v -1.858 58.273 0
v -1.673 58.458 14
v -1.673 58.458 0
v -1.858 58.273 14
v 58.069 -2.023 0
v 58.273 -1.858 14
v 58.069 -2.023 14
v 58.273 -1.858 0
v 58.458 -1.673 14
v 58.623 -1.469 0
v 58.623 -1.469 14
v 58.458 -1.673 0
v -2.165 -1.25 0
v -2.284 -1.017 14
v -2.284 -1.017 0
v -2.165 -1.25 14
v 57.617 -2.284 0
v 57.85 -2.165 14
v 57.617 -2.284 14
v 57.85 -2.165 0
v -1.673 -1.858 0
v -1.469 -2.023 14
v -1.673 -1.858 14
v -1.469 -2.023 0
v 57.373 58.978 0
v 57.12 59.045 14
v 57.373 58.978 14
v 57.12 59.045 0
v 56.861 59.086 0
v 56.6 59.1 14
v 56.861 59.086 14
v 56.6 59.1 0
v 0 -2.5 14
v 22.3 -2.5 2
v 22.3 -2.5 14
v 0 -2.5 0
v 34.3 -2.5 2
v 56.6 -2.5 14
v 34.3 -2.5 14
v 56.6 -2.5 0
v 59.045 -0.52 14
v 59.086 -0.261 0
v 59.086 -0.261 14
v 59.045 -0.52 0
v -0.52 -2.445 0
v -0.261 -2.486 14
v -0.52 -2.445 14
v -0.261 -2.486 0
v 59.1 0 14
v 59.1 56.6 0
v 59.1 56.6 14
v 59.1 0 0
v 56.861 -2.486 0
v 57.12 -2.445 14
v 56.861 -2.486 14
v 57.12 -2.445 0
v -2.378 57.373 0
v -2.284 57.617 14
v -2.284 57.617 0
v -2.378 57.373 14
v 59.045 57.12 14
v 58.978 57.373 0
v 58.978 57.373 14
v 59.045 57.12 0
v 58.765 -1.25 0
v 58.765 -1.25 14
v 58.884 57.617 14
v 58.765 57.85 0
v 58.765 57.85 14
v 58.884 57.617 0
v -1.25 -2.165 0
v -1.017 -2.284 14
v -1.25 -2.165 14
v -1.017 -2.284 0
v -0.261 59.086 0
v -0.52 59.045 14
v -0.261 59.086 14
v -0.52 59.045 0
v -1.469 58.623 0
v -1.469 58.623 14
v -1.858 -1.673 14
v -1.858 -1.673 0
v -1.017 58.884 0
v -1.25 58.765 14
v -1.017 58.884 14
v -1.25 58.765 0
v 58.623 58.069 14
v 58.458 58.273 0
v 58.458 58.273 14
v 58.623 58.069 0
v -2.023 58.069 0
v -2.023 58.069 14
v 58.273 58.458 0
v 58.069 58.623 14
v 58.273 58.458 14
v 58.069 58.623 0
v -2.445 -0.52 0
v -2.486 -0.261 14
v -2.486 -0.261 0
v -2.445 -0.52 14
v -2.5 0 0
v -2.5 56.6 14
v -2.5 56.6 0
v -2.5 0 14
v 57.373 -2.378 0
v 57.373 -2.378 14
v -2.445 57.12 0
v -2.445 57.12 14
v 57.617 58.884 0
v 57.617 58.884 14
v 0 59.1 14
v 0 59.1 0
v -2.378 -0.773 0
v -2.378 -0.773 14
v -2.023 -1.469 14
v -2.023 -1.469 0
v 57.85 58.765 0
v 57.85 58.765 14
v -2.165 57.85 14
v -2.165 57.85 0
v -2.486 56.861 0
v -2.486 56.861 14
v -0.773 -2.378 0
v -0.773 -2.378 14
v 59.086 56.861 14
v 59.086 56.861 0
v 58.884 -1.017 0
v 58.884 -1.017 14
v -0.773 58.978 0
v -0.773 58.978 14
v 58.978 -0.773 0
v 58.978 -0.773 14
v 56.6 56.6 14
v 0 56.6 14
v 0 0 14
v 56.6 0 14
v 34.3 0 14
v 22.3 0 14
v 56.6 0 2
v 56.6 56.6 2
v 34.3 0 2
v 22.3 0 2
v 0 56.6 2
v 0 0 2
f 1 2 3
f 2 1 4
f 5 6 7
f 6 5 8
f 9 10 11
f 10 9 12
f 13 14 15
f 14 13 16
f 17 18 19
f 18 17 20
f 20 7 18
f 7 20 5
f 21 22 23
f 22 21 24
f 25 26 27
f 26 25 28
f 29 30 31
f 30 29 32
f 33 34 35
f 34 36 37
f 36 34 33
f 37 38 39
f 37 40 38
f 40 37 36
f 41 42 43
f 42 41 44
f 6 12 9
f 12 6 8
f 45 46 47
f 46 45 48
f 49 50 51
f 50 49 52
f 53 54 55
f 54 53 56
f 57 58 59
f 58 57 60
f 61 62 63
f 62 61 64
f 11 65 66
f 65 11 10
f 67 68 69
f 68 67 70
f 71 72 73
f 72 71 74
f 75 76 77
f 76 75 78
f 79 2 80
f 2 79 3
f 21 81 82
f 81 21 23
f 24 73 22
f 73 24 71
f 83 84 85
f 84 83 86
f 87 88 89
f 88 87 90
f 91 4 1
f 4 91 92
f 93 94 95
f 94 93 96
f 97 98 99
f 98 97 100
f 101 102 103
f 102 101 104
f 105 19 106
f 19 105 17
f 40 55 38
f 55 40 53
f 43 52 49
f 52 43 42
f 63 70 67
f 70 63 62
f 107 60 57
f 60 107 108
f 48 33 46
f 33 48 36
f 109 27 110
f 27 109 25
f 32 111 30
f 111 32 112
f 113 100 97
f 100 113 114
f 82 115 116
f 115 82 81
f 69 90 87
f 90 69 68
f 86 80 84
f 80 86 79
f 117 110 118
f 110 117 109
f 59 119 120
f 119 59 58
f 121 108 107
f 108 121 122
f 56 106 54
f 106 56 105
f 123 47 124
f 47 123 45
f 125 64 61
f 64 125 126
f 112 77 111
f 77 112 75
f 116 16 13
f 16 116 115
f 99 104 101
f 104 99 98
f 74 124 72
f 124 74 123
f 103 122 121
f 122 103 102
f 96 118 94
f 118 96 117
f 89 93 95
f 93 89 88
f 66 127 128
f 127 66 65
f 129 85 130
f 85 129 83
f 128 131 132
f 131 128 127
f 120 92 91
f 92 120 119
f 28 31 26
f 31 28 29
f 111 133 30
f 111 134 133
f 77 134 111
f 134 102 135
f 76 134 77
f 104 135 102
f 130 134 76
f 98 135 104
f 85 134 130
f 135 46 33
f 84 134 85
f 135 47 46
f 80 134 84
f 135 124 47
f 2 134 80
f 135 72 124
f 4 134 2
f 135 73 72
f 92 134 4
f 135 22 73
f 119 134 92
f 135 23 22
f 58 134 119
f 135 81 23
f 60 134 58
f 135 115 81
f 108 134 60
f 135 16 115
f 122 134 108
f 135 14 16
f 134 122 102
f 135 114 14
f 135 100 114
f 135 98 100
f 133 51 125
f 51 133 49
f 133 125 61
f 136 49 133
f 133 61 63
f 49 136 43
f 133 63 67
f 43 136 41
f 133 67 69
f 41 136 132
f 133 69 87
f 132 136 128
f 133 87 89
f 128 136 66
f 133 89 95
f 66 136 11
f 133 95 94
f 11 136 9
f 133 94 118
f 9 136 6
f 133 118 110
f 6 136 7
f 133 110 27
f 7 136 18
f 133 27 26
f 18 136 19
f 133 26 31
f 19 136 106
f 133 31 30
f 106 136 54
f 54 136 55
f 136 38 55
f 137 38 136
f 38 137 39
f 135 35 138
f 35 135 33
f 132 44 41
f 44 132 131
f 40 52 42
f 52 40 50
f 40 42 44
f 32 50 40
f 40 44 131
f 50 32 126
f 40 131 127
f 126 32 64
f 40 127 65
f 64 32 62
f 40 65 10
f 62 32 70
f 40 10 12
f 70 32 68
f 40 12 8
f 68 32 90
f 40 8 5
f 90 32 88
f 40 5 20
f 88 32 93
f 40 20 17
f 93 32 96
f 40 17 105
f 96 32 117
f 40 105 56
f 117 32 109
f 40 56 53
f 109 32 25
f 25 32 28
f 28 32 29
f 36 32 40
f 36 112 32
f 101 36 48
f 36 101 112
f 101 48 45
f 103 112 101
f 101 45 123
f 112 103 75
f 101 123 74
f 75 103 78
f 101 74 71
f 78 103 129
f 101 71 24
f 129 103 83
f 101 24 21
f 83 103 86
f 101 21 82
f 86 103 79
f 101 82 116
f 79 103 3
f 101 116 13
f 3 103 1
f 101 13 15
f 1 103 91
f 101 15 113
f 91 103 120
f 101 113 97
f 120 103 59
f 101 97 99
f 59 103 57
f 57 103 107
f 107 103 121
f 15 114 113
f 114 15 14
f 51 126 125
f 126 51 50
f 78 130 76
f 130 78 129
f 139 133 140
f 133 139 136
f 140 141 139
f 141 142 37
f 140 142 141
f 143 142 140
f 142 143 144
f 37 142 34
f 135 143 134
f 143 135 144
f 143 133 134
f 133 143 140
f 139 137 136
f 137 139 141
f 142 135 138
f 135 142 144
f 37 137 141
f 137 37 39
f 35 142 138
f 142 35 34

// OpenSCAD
// =================================================================
// ĐỒ ÁN: AUTONOMOUS ROBOT WAITER SYSTEM
// THIẾT KẾ: KHAY ĐỠ VUÔNG CHO LIDAR C1 (ĐÁY KÍN, KHÔNG VÍT)
// KÍCH THƯỚC CHUẨN: 55.6mm x 55.6mm x 41.3mm
// Hướng dẫn bởi: Giảng viên Robot & AI
// =================================================================

$fn = 60; // Độ mịn bo góc viền ngoài

// --- THAM SỐ CƠ BẢN (Đơn vị: mm) ---
lidar_w    = 55.6;   // Chiều dài đáy LiDAR C1
lidar_l    = 55.6;   // Chiều rộng đáy LiDAR C1

clearance  = 0.5;    // Khoảng hở an toàn để thả LiDAR vào khít (Snug fit)
wall_thick = 2.5;    // Độ dày thành khay bao quanh
base_thick = 2.0;    // Độ dày tấm đáy kín hoàn toàn
tray_depth = 12.0;   // Chiều cao thành nhựa (ôm chắc 1/3 thân dưới của LiDAR)

// Kích thước lòng trong của khay vuông
inner_w = lidar_w + (clearance * 2);
inner_l = lidar_l + (clearance * 2);

// --- THỰC THI TẠO MÔ HÌNH KHAY VUÔNG ---
difference() {
    // 1. Tạo khối hộp đặc bên ngoài (Đã bo viền nhẹ bằng minkowski)
    minkowski() {
        cube([inner_w, inner_l, tray_depth + base_thick - 1]);
        cylinder(r = wall_thick, h = 1);
    }
    
    // 2. Khoét rỗng lòng trong hình vuông, giữ lại đáy kín dày 2mm
    translate([0, 0, base_thick])
        cube([inner_w, inner_l, tray_depth + 2]);
        
    // 3. RÃNH THOÁT DÂY CÁP TÍN HIỆU (CABLE SLOT)
    // Thiết kế một rãnh khuyết rộng 12mm sát đáy để em luồn dây nguồn/cáp dữ liệu ra ngoài
    translate([inner_w / 2 - 6, -wall_thick - 1, base_thick])
        cube([12, wall_thick + 2, tray_depth + 2]);
}
